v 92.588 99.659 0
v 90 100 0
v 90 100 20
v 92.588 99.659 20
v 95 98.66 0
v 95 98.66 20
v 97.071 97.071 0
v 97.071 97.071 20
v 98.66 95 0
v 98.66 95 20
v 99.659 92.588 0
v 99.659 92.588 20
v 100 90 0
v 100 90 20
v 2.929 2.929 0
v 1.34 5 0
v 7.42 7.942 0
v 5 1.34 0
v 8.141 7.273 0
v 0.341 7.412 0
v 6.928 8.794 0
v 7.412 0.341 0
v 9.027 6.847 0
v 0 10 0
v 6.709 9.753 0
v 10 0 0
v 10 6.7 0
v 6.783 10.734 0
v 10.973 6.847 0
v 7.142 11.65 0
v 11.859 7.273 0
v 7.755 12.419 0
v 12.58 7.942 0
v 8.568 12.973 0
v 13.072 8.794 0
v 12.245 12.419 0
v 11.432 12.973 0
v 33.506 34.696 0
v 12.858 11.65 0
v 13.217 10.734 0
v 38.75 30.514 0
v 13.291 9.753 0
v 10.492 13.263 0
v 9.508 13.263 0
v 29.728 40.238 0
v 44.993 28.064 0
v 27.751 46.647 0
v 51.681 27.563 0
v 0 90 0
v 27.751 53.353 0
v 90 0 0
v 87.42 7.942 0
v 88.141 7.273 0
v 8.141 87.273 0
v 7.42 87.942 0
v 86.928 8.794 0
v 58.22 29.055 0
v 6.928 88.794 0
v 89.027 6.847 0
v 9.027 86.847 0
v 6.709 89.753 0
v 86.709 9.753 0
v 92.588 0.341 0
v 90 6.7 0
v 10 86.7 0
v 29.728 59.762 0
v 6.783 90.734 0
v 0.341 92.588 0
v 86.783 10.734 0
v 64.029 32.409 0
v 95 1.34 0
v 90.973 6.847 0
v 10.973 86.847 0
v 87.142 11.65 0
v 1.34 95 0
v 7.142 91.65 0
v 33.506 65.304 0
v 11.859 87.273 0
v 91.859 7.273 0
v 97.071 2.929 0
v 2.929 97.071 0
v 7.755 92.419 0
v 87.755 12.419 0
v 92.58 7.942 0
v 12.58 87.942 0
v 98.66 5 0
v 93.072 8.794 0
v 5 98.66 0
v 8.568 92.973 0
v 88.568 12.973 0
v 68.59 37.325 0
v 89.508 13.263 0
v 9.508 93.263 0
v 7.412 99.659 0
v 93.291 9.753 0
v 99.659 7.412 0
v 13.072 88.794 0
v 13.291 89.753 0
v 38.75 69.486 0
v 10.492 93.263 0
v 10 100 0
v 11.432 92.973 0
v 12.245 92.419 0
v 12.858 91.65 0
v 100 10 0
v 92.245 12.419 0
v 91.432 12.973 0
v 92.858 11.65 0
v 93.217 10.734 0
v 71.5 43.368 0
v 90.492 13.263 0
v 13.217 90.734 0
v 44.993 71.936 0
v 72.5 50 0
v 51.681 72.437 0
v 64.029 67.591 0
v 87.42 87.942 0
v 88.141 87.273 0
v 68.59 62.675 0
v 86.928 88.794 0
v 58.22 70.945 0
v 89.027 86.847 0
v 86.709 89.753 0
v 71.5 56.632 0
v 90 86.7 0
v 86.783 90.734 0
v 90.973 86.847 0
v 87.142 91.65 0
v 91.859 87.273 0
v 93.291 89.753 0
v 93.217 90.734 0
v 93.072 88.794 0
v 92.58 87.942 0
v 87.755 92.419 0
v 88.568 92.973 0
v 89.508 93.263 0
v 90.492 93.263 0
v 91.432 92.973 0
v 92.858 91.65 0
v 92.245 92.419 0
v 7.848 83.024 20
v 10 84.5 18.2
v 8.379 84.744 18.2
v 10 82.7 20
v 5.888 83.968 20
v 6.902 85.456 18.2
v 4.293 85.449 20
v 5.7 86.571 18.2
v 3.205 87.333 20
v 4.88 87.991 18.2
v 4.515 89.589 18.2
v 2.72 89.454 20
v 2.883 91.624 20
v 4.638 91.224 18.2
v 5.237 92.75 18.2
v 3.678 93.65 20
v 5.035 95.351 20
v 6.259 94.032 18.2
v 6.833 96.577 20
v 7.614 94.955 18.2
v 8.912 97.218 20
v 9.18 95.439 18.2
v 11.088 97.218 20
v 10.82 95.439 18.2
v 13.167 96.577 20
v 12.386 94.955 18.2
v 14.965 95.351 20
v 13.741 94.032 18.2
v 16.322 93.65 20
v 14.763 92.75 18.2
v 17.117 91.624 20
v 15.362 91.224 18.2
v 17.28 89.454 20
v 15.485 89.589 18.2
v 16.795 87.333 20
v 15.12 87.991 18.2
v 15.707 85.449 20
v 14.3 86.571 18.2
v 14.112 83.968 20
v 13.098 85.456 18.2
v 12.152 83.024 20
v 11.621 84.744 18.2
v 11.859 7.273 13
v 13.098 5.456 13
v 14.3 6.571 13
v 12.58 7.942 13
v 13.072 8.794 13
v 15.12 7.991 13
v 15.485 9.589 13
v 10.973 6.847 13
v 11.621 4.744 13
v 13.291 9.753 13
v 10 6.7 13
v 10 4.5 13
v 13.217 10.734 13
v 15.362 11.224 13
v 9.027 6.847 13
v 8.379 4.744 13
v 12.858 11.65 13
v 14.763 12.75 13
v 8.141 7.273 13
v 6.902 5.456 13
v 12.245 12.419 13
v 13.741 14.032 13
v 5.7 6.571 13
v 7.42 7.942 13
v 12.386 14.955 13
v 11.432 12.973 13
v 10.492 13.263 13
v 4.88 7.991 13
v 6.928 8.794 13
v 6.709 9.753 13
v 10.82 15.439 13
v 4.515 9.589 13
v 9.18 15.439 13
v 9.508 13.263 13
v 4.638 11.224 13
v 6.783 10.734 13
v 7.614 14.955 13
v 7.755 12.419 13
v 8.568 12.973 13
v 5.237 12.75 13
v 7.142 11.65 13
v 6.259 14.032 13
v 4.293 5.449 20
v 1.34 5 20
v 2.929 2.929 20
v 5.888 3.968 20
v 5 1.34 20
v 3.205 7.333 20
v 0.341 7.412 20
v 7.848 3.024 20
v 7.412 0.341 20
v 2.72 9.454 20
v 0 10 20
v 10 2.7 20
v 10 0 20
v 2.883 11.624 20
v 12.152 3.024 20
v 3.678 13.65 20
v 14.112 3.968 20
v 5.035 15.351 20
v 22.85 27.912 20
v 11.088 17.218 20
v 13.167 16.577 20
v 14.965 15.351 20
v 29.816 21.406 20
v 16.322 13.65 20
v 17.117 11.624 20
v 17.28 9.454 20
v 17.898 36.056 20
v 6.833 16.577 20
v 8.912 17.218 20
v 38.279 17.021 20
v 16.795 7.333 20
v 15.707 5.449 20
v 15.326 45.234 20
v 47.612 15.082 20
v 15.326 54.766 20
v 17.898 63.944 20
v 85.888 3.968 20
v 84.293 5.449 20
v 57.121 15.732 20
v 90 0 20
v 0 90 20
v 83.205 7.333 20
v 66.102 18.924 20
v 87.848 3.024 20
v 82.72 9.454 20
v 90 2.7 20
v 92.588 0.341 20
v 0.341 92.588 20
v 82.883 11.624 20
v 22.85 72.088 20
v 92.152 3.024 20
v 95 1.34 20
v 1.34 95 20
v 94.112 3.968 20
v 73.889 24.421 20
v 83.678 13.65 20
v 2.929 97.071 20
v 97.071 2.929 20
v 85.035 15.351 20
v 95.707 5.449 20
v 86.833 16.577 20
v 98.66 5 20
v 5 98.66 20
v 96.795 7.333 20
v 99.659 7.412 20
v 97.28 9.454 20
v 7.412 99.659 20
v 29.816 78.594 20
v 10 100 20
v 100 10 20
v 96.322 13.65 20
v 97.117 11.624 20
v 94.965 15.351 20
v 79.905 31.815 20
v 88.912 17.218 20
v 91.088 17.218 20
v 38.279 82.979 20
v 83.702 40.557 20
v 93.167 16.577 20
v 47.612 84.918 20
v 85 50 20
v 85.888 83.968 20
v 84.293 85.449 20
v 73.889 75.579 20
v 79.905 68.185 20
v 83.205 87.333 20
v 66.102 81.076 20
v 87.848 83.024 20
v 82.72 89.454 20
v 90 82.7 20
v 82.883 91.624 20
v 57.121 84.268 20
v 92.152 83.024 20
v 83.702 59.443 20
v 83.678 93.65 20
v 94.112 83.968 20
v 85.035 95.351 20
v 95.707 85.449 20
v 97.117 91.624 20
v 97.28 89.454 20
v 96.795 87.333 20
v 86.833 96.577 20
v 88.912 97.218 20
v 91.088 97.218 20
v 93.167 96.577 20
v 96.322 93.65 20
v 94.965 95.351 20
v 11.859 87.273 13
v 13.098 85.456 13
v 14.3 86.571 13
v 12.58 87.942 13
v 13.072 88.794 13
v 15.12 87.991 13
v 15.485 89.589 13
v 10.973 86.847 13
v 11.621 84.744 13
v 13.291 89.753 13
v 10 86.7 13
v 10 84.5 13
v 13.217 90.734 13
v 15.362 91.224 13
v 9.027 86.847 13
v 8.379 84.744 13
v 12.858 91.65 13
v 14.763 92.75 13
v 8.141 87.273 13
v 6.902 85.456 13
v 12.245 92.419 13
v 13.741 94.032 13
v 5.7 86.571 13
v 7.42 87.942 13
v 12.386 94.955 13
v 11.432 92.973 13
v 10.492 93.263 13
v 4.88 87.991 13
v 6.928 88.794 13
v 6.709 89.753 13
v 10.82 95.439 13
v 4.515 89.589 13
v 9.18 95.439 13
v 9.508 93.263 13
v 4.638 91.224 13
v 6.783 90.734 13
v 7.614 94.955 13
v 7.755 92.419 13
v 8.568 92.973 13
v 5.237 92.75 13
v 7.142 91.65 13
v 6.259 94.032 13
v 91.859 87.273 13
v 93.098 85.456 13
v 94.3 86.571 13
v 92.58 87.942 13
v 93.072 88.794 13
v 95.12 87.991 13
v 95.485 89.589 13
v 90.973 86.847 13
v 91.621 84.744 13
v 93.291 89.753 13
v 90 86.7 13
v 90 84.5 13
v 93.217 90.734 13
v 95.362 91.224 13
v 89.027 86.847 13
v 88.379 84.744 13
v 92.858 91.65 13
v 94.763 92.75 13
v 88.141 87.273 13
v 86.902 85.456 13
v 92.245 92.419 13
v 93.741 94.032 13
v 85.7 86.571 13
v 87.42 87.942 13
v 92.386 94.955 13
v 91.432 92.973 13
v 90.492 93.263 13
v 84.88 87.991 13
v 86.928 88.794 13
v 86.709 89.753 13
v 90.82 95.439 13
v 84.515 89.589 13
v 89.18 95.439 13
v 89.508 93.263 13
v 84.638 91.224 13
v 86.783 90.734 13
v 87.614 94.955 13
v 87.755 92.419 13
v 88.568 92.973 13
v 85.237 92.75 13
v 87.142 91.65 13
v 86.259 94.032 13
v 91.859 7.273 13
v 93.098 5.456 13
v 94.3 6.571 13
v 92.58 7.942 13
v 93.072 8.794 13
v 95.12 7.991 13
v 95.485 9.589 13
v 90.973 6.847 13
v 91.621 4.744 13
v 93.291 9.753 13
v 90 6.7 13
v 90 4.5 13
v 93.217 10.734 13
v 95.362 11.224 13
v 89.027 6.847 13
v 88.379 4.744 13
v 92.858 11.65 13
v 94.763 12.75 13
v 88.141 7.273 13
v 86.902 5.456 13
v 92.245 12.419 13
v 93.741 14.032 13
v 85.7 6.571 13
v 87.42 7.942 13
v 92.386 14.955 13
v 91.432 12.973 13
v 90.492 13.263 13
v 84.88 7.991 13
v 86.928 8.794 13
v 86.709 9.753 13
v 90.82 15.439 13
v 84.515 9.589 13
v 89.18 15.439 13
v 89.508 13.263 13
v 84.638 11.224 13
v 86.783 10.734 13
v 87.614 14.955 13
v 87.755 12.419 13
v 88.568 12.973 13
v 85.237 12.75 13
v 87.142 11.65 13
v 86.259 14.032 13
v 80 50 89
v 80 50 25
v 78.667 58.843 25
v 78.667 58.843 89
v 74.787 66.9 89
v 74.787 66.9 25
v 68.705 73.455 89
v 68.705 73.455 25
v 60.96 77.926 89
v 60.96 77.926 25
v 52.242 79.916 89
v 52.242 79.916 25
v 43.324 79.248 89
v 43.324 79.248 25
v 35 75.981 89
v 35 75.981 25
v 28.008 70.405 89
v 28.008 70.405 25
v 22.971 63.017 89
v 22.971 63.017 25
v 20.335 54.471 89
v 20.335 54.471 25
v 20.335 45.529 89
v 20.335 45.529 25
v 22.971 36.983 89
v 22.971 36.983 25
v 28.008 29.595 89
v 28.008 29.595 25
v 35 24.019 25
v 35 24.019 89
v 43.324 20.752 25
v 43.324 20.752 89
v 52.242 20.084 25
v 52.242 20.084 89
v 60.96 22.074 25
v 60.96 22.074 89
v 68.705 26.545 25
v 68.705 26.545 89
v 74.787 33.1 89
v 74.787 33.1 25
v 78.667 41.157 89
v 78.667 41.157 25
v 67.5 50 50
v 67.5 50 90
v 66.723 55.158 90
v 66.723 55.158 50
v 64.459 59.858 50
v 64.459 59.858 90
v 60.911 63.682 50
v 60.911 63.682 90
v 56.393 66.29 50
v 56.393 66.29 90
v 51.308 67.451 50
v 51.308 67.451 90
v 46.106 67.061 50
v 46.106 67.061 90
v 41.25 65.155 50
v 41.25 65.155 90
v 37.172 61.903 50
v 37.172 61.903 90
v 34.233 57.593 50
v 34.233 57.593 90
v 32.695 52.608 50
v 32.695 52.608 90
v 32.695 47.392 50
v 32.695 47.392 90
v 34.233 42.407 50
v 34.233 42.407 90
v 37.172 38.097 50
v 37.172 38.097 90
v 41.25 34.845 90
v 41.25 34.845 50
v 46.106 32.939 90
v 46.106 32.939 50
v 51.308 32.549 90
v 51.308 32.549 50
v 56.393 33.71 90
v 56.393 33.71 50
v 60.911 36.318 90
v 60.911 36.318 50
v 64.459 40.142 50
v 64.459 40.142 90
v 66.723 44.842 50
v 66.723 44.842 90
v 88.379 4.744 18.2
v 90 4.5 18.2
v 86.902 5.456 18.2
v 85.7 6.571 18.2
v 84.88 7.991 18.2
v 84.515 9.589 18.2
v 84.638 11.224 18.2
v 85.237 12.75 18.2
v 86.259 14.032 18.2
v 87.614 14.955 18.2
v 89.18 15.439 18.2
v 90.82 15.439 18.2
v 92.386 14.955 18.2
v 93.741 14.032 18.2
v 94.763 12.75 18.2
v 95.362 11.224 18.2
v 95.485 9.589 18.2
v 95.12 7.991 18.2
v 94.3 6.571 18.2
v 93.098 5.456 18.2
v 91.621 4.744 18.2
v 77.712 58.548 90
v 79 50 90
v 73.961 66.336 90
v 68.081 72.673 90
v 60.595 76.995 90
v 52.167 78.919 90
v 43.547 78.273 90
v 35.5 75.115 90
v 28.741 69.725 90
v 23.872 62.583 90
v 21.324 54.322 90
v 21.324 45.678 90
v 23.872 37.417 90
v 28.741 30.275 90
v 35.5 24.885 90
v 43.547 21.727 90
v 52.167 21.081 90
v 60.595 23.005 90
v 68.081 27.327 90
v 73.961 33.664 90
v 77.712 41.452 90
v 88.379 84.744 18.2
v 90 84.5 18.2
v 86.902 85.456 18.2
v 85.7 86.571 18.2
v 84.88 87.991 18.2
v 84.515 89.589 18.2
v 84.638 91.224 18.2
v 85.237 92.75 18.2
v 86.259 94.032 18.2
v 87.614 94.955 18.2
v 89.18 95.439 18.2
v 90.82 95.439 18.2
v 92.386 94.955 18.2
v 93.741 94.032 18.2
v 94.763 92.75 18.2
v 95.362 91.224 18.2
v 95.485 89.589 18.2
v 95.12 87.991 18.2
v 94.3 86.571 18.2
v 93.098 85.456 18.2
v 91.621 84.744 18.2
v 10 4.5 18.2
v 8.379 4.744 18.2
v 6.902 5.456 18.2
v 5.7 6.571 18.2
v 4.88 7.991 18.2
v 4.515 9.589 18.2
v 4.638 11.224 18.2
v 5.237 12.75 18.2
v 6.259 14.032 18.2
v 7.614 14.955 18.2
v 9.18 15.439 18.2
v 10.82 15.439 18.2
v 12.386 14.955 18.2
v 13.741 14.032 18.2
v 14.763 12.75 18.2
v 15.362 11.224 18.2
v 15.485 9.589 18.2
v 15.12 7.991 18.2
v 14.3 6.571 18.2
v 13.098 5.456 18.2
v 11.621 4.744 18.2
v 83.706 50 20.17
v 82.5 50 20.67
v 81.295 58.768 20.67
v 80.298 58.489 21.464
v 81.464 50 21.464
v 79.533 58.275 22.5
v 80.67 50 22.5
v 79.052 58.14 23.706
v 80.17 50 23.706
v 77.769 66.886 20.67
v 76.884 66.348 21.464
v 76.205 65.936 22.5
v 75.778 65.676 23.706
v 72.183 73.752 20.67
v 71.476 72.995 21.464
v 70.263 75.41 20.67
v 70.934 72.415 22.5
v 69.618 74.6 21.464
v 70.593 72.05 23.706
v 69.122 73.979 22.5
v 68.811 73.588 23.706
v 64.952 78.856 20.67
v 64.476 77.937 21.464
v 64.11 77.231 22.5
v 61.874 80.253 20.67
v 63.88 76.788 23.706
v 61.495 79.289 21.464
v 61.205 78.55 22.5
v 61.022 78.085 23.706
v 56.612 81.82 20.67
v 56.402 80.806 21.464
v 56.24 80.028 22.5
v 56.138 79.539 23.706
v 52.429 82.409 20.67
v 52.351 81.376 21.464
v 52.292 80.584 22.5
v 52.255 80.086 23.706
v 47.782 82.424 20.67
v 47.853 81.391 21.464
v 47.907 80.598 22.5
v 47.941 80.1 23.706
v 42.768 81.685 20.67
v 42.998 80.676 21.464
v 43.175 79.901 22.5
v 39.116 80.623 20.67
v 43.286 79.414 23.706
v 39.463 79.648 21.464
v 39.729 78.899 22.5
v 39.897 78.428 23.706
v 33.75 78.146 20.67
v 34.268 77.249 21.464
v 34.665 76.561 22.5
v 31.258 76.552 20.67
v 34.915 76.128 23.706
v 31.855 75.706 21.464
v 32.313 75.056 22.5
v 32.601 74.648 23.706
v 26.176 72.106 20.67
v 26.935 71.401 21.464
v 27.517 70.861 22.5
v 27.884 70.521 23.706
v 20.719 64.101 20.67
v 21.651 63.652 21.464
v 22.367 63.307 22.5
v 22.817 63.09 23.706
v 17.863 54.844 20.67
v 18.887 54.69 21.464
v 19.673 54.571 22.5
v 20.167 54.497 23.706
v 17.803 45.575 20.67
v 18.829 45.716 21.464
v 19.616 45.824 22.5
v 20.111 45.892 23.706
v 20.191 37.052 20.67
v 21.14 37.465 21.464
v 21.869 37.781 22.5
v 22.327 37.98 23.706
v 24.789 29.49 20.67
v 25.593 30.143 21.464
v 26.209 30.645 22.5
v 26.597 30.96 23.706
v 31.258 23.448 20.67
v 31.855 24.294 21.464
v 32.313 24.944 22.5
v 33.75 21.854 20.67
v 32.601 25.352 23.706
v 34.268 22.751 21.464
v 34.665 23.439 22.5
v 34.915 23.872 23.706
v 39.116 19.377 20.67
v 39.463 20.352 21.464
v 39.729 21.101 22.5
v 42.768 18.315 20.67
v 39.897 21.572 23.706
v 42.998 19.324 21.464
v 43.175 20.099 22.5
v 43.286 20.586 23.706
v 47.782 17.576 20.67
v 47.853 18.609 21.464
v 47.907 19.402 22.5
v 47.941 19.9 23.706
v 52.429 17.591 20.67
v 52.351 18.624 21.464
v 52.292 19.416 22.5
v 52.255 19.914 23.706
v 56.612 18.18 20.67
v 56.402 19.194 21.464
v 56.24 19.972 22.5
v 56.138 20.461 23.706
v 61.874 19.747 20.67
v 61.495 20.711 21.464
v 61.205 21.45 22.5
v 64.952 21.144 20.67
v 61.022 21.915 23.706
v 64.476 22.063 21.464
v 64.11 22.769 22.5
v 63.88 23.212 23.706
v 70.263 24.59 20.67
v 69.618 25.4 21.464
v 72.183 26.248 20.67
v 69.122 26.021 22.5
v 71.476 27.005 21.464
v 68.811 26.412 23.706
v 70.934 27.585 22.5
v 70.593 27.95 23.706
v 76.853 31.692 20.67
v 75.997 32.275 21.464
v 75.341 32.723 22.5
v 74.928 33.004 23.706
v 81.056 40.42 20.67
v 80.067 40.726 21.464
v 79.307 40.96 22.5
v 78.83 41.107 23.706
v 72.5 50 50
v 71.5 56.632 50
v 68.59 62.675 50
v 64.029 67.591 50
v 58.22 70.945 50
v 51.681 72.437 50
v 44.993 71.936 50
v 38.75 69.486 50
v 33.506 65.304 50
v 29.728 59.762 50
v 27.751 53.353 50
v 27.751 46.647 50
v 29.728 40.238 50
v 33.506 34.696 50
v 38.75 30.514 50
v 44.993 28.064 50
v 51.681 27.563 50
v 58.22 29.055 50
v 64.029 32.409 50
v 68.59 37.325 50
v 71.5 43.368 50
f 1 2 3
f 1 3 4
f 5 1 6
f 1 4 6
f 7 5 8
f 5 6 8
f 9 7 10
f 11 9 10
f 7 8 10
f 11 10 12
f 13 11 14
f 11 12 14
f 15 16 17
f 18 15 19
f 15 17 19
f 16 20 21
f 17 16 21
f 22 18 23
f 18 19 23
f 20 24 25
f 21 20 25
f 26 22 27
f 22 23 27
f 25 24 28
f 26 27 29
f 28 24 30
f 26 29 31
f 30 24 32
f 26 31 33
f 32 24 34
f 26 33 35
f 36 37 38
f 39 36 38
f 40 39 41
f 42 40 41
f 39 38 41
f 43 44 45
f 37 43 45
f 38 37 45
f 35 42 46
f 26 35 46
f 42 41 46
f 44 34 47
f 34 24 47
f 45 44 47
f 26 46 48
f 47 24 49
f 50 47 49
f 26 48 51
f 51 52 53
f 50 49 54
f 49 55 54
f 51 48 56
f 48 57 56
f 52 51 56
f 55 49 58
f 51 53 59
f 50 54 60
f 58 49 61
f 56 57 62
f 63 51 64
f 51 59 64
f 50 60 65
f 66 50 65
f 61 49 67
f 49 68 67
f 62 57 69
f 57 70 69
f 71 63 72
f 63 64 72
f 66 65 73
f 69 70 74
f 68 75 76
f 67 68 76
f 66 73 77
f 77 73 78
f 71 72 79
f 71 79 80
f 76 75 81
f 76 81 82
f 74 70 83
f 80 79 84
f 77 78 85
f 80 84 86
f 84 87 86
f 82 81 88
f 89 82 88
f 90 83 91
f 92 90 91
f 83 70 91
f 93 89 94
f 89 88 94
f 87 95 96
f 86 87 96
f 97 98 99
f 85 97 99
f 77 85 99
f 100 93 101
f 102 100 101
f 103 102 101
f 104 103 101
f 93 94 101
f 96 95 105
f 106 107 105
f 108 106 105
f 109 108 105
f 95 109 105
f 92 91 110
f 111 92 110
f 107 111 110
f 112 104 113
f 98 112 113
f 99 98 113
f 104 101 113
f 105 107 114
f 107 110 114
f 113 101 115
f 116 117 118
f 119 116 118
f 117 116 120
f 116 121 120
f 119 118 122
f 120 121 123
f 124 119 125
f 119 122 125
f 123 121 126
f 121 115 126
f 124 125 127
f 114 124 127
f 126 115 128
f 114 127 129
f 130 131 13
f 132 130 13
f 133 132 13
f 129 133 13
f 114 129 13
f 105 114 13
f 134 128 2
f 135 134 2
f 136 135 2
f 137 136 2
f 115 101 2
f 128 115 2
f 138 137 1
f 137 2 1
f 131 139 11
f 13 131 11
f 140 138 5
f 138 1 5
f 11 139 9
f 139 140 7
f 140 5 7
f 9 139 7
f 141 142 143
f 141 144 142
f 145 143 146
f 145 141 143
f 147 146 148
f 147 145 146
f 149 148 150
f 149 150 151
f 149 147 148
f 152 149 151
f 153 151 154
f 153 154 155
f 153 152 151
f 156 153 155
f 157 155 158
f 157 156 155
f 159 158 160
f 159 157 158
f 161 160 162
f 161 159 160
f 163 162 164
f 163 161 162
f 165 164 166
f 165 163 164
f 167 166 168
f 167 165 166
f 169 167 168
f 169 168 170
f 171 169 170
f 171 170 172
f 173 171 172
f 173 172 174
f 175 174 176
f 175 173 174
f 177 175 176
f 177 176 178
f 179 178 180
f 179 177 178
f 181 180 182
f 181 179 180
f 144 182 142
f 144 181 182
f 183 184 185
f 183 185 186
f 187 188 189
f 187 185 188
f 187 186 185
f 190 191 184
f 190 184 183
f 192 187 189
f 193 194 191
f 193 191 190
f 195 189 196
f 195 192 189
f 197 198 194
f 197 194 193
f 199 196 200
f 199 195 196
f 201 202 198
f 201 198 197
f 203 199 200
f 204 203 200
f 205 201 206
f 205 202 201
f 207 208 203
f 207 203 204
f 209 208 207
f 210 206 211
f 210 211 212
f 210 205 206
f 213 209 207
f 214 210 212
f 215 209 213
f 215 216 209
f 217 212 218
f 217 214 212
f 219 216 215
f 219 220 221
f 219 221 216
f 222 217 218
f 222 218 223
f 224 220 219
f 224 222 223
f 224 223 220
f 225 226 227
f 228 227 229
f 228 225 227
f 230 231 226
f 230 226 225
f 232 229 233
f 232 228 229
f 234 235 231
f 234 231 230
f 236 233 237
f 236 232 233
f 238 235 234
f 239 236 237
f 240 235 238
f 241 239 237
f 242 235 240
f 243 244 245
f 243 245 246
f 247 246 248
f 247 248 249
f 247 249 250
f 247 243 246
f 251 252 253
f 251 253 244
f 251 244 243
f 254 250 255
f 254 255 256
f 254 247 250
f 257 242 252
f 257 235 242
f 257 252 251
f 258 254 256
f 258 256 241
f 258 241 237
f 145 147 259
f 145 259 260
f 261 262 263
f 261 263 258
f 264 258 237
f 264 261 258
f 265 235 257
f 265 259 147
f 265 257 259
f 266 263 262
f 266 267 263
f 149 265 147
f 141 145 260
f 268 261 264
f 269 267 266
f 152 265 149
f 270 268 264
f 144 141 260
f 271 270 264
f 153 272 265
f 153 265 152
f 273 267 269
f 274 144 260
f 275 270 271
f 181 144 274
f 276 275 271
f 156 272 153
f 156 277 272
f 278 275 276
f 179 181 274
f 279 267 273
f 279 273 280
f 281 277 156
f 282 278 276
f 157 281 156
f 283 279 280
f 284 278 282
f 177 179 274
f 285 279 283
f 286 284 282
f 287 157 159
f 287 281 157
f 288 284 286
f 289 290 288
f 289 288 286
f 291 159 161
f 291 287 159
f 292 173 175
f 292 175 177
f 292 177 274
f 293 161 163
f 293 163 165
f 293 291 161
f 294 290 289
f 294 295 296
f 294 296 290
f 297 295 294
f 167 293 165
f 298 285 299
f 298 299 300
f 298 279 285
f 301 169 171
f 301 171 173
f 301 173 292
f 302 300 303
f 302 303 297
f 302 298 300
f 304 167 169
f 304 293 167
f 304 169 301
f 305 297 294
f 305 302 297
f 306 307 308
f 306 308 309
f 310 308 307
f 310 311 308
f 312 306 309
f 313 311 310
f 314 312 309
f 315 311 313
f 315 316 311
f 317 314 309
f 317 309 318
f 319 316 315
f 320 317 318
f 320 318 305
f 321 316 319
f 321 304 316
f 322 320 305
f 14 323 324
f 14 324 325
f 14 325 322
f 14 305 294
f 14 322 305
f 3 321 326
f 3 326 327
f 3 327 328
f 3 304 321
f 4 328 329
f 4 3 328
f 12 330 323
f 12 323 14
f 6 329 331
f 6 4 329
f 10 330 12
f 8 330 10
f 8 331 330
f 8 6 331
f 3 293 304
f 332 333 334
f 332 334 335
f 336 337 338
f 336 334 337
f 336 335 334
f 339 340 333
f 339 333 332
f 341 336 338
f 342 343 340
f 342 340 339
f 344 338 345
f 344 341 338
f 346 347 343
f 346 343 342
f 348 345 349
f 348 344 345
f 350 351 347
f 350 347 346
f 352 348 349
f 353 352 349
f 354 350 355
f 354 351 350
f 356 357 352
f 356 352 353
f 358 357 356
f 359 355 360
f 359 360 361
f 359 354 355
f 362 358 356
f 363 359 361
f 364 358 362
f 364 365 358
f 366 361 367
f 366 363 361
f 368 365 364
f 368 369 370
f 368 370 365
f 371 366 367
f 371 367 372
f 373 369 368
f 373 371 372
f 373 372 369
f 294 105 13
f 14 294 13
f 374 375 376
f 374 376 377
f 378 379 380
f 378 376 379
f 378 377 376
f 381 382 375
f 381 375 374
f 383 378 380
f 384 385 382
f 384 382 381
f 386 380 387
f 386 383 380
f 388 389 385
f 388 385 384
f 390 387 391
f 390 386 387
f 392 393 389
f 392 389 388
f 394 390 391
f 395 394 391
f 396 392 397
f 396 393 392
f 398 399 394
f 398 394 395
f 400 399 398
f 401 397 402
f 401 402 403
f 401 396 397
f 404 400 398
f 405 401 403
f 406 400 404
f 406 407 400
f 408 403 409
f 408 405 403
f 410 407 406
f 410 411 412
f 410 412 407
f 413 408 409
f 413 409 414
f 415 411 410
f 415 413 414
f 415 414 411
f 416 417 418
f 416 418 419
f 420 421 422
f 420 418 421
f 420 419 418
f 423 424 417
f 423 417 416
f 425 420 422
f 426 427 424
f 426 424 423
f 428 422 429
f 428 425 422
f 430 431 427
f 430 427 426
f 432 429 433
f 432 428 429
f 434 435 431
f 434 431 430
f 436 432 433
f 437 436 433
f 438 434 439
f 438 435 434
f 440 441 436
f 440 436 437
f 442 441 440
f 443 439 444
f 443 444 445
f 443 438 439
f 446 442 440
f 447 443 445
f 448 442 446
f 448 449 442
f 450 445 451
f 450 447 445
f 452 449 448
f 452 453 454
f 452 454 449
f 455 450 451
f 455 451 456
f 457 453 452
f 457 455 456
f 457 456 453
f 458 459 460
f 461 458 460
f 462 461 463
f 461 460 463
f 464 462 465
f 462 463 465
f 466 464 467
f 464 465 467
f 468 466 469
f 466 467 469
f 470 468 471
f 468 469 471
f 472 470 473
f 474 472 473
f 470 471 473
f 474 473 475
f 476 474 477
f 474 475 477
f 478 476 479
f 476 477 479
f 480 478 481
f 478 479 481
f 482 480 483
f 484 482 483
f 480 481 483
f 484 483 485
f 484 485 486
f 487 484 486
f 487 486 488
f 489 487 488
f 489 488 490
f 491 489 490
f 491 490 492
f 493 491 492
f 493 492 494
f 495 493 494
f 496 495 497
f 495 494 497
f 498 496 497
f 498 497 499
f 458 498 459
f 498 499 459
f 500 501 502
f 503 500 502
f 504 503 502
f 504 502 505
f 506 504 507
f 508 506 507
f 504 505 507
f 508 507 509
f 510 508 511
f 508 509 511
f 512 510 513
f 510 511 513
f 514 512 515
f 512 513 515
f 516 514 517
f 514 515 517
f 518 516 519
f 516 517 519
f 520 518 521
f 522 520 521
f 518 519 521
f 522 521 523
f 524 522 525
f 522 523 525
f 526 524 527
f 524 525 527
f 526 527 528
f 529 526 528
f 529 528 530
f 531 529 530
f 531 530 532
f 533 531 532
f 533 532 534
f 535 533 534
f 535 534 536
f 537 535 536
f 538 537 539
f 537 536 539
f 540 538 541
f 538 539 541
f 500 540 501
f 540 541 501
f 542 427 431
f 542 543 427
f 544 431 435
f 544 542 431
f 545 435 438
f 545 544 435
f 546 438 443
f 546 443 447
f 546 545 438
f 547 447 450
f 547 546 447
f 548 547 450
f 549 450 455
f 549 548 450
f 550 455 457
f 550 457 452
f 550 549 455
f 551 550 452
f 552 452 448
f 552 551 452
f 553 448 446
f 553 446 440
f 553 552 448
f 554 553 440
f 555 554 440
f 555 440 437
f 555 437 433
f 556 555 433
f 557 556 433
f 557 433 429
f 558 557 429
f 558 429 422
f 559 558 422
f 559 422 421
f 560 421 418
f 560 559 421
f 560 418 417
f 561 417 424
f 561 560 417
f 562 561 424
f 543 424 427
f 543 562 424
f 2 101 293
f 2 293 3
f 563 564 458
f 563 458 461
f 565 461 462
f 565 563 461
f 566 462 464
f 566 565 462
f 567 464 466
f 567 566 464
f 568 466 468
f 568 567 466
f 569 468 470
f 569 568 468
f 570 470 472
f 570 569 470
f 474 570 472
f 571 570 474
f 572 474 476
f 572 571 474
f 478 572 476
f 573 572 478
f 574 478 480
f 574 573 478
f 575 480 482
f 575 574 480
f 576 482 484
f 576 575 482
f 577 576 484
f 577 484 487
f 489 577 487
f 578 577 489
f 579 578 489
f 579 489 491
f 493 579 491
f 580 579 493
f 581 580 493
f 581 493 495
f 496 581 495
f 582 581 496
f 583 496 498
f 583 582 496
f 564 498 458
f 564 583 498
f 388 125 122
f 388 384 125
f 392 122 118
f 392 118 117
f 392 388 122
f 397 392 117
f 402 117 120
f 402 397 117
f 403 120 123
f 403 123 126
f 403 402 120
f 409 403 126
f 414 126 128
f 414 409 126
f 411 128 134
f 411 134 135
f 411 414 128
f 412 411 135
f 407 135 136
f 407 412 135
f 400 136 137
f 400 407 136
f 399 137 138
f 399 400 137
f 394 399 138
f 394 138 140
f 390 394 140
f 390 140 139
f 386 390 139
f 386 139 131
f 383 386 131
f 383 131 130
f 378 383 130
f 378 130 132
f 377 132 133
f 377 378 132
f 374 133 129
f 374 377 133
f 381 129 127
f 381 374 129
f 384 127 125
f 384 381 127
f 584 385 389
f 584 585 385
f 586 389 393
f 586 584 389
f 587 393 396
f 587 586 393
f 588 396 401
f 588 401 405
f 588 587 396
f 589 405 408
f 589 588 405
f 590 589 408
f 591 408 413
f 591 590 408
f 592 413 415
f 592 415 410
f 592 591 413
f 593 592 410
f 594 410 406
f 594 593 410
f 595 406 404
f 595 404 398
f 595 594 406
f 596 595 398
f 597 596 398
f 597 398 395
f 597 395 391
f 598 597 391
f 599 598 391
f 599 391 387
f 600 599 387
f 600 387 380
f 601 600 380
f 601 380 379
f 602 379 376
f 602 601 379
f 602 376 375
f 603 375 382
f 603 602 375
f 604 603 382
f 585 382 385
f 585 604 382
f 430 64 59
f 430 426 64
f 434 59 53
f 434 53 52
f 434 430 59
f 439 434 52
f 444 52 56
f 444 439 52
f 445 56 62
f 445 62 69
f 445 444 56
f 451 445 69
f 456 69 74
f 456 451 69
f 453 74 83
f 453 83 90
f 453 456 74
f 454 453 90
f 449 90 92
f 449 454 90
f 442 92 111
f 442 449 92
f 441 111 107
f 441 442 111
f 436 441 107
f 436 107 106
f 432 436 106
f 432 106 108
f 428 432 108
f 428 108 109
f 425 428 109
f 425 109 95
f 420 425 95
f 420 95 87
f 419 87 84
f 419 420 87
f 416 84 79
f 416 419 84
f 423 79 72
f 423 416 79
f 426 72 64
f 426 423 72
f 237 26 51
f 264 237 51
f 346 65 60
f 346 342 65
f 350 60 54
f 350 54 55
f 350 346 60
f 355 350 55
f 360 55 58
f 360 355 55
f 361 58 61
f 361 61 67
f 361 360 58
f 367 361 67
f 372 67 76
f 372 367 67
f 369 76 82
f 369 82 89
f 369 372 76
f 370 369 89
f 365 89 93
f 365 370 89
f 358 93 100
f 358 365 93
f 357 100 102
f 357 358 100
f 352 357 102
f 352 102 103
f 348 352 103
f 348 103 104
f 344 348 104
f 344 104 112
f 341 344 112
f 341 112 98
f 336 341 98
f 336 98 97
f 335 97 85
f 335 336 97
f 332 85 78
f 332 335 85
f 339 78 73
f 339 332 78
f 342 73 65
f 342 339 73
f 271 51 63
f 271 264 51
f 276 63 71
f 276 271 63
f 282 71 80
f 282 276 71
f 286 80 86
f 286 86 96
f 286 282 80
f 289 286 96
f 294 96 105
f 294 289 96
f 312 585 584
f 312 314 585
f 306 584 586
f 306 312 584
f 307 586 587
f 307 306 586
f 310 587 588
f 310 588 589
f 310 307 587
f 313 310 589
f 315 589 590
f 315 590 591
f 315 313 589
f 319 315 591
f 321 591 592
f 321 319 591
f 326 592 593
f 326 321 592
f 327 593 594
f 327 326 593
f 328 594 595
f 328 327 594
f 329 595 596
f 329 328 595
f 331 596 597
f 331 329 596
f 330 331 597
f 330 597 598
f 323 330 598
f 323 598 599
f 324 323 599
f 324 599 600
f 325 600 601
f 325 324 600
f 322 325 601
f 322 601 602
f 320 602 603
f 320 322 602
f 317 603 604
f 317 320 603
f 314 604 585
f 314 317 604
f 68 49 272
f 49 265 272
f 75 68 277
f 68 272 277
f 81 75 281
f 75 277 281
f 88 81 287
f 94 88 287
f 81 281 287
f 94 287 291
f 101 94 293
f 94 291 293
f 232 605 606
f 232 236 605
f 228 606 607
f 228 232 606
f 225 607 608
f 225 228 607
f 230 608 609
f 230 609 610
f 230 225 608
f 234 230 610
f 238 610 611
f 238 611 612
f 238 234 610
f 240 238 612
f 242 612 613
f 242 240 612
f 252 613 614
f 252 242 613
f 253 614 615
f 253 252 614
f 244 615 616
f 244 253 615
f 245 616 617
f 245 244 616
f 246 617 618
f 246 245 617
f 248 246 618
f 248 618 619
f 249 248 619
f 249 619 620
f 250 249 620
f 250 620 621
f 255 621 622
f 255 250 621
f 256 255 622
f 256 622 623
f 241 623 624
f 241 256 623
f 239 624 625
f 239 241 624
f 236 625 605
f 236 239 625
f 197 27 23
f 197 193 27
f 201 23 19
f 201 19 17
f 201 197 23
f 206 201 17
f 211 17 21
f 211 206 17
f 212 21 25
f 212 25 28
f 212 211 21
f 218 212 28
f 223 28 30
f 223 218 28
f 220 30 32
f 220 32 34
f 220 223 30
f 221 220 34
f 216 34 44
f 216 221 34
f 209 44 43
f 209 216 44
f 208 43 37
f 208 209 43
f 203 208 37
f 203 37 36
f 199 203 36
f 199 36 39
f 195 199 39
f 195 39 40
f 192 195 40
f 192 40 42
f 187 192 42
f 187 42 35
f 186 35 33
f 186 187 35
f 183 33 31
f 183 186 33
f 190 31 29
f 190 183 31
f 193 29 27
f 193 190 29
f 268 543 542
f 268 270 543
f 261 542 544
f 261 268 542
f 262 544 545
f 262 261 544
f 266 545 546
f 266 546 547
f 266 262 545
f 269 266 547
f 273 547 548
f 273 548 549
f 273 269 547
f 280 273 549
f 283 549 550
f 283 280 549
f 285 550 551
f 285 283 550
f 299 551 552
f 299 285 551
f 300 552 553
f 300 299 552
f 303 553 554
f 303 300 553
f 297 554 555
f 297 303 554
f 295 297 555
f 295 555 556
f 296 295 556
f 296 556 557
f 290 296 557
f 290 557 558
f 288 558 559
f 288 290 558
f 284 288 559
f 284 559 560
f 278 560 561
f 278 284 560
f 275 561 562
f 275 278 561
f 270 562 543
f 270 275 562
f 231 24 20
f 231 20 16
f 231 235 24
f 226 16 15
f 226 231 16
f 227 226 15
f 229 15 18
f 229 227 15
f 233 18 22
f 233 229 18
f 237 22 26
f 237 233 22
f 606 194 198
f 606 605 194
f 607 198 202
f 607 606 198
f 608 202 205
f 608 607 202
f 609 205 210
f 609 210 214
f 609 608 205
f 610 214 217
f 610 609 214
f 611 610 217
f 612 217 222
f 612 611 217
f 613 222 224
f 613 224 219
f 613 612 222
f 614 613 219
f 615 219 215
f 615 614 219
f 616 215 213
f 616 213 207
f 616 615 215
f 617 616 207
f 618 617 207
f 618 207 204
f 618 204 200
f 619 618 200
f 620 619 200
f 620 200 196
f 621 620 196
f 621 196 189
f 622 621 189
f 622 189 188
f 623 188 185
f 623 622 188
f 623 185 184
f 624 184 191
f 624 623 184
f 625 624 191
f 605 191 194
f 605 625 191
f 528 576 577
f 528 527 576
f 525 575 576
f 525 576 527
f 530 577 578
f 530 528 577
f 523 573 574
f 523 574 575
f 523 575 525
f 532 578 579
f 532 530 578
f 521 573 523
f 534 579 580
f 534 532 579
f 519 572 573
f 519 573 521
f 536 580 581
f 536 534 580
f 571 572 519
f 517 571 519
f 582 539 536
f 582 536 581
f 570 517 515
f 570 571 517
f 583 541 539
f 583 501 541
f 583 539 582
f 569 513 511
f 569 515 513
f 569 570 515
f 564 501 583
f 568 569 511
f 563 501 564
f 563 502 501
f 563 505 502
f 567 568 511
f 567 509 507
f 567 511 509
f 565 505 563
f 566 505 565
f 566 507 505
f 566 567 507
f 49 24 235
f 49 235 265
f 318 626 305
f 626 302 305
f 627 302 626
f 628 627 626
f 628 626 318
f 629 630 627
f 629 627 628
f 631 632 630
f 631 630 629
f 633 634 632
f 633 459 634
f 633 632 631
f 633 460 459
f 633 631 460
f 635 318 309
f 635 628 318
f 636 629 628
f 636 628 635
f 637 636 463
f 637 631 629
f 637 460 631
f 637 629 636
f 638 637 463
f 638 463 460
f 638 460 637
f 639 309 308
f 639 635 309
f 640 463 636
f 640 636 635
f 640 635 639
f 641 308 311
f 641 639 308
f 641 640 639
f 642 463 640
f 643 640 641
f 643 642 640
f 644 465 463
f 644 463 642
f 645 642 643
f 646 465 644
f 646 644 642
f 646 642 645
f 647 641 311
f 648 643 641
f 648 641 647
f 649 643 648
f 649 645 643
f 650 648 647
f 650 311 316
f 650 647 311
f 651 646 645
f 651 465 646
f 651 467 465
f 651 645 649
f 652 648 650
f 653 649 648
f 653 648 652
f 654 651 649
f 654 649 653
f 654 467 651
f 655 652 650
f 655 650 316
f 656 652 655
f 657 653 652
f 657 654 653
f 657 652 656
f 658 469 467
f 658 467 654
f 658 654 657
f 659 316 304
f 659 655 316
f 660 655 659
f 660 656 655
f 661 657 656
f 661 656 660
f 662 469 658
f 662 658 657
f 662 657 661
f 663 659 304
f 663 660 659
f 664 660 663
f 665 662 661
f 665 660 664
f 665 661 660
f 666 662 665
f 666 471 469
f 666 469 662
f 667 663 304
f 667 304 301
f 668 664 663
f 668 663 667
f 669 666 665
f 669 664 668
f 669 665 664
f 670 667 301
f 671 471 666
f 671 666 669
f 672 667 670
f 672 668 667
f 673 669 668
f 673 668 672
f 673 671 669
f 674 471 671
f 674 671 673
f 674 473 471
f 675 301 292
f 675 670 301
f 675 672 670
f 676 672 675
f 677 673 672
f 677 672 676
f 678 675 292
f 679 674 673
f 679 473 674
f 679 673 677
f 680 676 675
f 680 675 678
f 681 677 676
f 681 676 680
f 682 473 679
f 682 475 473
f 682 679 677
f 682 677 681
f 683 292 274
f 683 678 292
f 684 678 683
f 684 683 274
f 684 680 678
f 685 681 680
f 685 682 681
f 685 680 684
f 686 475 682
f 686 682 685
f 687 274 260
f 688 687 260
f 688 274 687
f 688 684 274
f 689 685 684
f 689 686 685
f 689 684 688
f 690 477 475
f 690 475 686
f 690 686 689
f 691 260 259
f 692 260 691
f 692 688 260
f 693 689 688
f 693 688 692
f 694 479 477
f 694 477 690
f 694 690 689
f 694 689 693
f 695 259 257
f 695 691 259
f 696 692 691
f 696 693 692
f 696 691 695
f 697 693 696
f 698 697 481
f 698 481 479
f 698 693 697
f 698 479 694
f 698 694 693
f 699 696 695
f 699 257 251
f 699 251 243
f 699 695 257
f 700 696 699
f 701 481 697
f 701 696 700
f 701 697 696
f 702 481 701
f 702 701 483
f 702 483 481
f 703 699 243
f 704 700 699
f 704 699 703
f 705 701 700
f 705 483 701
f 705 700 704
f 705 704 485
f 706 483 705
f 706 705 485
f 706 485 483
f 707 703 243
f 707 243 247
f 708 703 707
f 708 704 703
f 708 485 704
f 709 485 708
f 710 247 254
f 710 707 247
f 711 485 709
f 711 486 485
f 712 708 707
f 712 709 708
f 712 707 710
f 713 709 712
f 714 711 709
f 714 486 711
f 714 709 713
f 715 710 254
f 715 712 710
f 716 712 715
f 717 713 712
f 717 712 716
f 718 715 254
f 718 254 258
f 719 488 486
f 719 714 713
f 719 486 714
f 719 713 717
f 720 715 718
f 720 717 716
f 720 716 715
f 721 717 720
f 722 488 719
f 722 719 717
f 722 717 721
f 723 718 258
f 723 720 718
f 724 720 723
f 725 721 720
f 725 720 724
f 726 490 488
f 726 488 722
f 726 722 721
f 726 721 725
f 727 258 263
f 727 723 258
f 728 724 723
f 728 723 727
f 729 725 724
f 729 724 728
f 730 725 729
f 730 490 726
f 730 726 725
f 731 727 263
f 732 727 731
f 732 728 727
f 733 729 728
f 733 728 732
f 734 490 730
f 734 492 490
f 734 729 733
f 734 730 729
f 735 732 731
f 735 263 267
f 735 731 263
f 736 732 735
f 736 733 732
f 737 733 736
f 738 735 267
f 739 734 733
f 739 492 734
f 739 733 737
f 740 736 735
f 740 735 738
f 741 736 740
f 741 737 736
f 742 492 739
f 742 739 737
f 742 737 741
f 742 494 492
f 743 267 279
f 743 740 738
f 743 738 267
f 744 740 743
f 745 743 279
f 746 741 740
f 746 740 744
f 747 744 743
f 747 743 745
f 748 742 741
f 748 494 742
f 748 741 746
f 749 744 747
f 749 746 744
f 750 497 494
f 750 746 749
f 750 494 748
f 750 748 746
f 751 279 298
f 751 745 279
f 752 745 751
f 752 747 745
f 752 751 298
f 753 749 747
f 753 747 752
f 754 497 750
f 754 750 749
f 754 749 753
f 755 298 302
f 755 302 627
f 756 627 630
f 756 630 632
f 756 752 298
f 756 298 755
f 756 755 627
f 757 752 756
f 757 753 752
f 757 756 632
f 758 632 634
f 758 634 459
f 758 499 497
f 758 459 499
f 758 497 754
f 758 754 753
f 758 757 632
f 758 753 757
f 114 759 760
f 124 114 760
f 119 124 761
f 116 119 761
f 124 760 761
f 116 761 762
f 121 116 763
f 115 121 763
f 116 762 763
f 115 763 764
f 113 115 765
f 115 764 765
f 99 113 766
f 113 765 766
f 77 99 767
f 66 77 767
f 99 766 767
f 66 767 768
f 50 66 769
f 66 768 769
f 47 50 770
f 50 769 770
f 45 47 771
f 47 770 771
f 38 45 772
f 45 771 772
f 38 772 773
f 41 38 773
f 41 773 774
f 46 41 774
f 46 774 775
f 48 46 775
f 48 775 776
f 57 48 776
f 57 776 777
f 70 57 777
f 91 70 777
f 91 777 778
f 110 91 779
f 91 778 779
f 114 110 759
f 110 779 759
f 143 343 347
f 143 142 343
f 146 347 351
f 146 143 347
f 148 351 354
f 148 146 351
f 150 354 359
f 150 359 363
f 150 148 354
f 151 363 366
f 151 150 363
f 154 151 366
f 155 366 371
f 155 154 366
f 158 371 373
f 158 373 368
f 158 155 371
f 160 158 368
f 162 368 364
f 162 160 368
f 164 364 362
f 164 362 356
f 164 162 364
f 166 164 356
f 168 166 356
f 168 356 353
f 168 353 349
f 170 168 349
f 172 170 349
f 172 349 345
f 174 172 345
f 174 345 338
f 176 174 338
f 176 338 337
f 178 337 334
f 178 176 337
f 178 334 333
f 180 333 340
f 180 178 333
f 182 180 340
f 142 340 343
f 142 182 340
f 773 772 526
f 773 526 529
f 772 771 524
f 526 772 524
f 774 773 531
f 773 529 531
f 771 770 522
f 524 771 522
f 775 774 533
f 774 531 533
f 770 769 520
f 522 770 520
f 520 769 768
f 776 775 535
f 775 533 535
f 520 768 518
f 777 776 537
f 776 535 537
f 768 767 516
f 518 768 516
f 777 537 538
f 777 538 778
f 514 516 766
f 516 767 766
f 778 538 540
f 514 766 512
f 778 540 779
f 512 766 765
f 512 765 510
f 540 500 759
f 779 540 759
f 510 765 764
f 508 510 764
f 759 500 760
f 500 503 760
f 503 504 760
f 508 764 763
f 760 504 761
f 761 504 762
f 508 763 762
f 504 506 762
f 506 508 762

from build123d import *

# Parameters (mm, degrees)
SKETCH1_W                              = 100
SKETCH1_H                              = 100
BOSS_EXTRUDE1_DEPTH                    = 20
SKETCH2_R                              = 30
BOSS_EXTRUDE2_DEPTH                    = 70
FILLET1_R                              = 5
CHAMFER1_SIZE                          = 1
FILLET2_R                              = 10
CBORE_FOR_M6_HEX_HEAD_BOLT4_AT_2_COUNT = 2
CBORE_FOR_M6_HEX_HEAD_BOLT4_AT_2_PITCH = 80
CBORE_FOR_M6_HEX_HEAD_BOLT4_AT_3_COUNT = 2
CBORE_FOR_M6_HEX_HEAD_BOLT4_AT_3_PITCH = 113.13708499
CBORE_FOR_M6_HEX_HEAD_BOLT4_AT_4_COUNT = 2
CBORE_FOR_M6_HEX_HEAD_BOLT4_AT_4_PITCH = 80
SKETCH4_R                              = 17.5
CUT_EXTRUDE1_DEPTH                     = 40
SKETCH16_R                             = 22.5
CUT_EXTRUDE2_DEPTH                     = 50


with BuildPart() as part:
    # Sketch1 → Boss-Extrude1 (new body)
    with BuildSketch(Plane.XY):
        with Locations((50, 50)):
            Rectangle(SKETCH1_W, SKETCH1_H)
    extrude(amount=BOSS_EXTRUDE1_DEPTH)

    # Sketch2 → Boss-Extrude2 (add)
    with BuildSketch(Plane.XY.offset(20)):
        with Locations((50, 50)):
            Circle(SKETCH2_R)
    extrude(amount=BOSS_EXTRUDE2_DEPTH)

    # Fillet1
    fillet1_edges = [part.edges().sort_by_distance(p)[0] for p in [
        (20, 50, 20),
    ]]
    fillet(fillet1_edges, radius=FILLET1_R)

    # Chamfer1
    chamfer1_edges = [part.edges().sort_by_distance(p)[0] for p in [
        (20, 50, 90),
    ]]
    chamfer(chamfer1_edges, length=CHAMFER1_SIZE)

    # Fillet2
    fillet2_edges = [part.edges().sort_by_distance(p)[0] for p in [
        (0, 100, 10),
        (100, 100, 10),
        (100, 0, 10),
        (0, 0, 10),
    ]]
    fillet(fillet2_edges, radius=FILLET2_R)

    # Sketch15 → CBORE for M6 Hex Head Bolt4 (revolve, cut)
    with BuildSketch(Plane(origin=(10, 90, 20), x_dir=(0, -1, 0), z_dir=(1, 0, 0))):
        Polygon((0, 0), (0, 20), (3.3, 20), (3.3, 7), (5.5, 7), (5.5, 1.8), (7.3, 0), align=None)
    cbore_for_m6_hex_head_bolt4 = revolve(axis=Axis((10, 90, 26.35), (0, 0, -1)), mode=Mode.SUBTRACT)

    # CBORE for M6 Hex Head Bolt4 at 2: CBORE for M6 Hex Head Bolt4 ×2
    with Locations(*[(0, -i * CBORE_FOR_M6_HEX_HEAD_BOLT4_AT_2_PITCH, 0) for i in range(1, CBORE_FOR_M6_HEX_HEAD_BOLT4_AT_2_COUNT)]):
        add(cbore_for_m6_hex_head_bolt4, mode=Mode.SUBTRACT)

    # CBORE for M6 Hex Head Bolt4 at 3: CBORE for M6 Hex Head Bolt4 ×2
    with Locations(*[Vector(0.7071067811865476, -0.7071067811865475, 0) * (i * CBORE_FOR_M6_HEX_HEAD_BOLT4_AT_3_PITCH) for i in range(1, CBORE_FOR_M6_HEX_HEAD_BOLT4_AT_3_COUNT)]):
        add(cbore_for_m6_hex_head_bolt4, mode=Mode.SUBTRACT)

    # CBORE for M6 Hex Head Bolt4 at 4: CBORE for M6 Hex Head Bolt4 ×2
    with Locations(*[(i * CBORE_FOR_M6_HEX_HEAD_BOLT4_AT_4_PITCH, 0, 0) for i in range(1, CBORE_FOR_M6_HEX_HEAD_BOLT4_AT_4_COUNT)]):
        add(cbore_for_m6_hex_head_bolt4, mode=Mode.SUBTRACT)

    # Sketch4 → Cut-Extrude1 (cut)
    with BuildSketch(Plane.XY.offset(90)):
        with Locations((50, 50)):
            Circle(SKETCH4_R)
    extrude(amount=-CUT_EXTRUDE1_DEPTH, mode=Mode.SUBTRACT)

    # Sketch16 → Cut-Extrude2 (cut)
    with BuildSketch(Plane.XY.offset(50)):
        with Locations((50, 50)):
            Circle(SKETCH16_R)
    extrude(amount=-CUT_EXTRUDE2_DEPTH, mode=Mode.SUBTRACT)


solid = part.part
